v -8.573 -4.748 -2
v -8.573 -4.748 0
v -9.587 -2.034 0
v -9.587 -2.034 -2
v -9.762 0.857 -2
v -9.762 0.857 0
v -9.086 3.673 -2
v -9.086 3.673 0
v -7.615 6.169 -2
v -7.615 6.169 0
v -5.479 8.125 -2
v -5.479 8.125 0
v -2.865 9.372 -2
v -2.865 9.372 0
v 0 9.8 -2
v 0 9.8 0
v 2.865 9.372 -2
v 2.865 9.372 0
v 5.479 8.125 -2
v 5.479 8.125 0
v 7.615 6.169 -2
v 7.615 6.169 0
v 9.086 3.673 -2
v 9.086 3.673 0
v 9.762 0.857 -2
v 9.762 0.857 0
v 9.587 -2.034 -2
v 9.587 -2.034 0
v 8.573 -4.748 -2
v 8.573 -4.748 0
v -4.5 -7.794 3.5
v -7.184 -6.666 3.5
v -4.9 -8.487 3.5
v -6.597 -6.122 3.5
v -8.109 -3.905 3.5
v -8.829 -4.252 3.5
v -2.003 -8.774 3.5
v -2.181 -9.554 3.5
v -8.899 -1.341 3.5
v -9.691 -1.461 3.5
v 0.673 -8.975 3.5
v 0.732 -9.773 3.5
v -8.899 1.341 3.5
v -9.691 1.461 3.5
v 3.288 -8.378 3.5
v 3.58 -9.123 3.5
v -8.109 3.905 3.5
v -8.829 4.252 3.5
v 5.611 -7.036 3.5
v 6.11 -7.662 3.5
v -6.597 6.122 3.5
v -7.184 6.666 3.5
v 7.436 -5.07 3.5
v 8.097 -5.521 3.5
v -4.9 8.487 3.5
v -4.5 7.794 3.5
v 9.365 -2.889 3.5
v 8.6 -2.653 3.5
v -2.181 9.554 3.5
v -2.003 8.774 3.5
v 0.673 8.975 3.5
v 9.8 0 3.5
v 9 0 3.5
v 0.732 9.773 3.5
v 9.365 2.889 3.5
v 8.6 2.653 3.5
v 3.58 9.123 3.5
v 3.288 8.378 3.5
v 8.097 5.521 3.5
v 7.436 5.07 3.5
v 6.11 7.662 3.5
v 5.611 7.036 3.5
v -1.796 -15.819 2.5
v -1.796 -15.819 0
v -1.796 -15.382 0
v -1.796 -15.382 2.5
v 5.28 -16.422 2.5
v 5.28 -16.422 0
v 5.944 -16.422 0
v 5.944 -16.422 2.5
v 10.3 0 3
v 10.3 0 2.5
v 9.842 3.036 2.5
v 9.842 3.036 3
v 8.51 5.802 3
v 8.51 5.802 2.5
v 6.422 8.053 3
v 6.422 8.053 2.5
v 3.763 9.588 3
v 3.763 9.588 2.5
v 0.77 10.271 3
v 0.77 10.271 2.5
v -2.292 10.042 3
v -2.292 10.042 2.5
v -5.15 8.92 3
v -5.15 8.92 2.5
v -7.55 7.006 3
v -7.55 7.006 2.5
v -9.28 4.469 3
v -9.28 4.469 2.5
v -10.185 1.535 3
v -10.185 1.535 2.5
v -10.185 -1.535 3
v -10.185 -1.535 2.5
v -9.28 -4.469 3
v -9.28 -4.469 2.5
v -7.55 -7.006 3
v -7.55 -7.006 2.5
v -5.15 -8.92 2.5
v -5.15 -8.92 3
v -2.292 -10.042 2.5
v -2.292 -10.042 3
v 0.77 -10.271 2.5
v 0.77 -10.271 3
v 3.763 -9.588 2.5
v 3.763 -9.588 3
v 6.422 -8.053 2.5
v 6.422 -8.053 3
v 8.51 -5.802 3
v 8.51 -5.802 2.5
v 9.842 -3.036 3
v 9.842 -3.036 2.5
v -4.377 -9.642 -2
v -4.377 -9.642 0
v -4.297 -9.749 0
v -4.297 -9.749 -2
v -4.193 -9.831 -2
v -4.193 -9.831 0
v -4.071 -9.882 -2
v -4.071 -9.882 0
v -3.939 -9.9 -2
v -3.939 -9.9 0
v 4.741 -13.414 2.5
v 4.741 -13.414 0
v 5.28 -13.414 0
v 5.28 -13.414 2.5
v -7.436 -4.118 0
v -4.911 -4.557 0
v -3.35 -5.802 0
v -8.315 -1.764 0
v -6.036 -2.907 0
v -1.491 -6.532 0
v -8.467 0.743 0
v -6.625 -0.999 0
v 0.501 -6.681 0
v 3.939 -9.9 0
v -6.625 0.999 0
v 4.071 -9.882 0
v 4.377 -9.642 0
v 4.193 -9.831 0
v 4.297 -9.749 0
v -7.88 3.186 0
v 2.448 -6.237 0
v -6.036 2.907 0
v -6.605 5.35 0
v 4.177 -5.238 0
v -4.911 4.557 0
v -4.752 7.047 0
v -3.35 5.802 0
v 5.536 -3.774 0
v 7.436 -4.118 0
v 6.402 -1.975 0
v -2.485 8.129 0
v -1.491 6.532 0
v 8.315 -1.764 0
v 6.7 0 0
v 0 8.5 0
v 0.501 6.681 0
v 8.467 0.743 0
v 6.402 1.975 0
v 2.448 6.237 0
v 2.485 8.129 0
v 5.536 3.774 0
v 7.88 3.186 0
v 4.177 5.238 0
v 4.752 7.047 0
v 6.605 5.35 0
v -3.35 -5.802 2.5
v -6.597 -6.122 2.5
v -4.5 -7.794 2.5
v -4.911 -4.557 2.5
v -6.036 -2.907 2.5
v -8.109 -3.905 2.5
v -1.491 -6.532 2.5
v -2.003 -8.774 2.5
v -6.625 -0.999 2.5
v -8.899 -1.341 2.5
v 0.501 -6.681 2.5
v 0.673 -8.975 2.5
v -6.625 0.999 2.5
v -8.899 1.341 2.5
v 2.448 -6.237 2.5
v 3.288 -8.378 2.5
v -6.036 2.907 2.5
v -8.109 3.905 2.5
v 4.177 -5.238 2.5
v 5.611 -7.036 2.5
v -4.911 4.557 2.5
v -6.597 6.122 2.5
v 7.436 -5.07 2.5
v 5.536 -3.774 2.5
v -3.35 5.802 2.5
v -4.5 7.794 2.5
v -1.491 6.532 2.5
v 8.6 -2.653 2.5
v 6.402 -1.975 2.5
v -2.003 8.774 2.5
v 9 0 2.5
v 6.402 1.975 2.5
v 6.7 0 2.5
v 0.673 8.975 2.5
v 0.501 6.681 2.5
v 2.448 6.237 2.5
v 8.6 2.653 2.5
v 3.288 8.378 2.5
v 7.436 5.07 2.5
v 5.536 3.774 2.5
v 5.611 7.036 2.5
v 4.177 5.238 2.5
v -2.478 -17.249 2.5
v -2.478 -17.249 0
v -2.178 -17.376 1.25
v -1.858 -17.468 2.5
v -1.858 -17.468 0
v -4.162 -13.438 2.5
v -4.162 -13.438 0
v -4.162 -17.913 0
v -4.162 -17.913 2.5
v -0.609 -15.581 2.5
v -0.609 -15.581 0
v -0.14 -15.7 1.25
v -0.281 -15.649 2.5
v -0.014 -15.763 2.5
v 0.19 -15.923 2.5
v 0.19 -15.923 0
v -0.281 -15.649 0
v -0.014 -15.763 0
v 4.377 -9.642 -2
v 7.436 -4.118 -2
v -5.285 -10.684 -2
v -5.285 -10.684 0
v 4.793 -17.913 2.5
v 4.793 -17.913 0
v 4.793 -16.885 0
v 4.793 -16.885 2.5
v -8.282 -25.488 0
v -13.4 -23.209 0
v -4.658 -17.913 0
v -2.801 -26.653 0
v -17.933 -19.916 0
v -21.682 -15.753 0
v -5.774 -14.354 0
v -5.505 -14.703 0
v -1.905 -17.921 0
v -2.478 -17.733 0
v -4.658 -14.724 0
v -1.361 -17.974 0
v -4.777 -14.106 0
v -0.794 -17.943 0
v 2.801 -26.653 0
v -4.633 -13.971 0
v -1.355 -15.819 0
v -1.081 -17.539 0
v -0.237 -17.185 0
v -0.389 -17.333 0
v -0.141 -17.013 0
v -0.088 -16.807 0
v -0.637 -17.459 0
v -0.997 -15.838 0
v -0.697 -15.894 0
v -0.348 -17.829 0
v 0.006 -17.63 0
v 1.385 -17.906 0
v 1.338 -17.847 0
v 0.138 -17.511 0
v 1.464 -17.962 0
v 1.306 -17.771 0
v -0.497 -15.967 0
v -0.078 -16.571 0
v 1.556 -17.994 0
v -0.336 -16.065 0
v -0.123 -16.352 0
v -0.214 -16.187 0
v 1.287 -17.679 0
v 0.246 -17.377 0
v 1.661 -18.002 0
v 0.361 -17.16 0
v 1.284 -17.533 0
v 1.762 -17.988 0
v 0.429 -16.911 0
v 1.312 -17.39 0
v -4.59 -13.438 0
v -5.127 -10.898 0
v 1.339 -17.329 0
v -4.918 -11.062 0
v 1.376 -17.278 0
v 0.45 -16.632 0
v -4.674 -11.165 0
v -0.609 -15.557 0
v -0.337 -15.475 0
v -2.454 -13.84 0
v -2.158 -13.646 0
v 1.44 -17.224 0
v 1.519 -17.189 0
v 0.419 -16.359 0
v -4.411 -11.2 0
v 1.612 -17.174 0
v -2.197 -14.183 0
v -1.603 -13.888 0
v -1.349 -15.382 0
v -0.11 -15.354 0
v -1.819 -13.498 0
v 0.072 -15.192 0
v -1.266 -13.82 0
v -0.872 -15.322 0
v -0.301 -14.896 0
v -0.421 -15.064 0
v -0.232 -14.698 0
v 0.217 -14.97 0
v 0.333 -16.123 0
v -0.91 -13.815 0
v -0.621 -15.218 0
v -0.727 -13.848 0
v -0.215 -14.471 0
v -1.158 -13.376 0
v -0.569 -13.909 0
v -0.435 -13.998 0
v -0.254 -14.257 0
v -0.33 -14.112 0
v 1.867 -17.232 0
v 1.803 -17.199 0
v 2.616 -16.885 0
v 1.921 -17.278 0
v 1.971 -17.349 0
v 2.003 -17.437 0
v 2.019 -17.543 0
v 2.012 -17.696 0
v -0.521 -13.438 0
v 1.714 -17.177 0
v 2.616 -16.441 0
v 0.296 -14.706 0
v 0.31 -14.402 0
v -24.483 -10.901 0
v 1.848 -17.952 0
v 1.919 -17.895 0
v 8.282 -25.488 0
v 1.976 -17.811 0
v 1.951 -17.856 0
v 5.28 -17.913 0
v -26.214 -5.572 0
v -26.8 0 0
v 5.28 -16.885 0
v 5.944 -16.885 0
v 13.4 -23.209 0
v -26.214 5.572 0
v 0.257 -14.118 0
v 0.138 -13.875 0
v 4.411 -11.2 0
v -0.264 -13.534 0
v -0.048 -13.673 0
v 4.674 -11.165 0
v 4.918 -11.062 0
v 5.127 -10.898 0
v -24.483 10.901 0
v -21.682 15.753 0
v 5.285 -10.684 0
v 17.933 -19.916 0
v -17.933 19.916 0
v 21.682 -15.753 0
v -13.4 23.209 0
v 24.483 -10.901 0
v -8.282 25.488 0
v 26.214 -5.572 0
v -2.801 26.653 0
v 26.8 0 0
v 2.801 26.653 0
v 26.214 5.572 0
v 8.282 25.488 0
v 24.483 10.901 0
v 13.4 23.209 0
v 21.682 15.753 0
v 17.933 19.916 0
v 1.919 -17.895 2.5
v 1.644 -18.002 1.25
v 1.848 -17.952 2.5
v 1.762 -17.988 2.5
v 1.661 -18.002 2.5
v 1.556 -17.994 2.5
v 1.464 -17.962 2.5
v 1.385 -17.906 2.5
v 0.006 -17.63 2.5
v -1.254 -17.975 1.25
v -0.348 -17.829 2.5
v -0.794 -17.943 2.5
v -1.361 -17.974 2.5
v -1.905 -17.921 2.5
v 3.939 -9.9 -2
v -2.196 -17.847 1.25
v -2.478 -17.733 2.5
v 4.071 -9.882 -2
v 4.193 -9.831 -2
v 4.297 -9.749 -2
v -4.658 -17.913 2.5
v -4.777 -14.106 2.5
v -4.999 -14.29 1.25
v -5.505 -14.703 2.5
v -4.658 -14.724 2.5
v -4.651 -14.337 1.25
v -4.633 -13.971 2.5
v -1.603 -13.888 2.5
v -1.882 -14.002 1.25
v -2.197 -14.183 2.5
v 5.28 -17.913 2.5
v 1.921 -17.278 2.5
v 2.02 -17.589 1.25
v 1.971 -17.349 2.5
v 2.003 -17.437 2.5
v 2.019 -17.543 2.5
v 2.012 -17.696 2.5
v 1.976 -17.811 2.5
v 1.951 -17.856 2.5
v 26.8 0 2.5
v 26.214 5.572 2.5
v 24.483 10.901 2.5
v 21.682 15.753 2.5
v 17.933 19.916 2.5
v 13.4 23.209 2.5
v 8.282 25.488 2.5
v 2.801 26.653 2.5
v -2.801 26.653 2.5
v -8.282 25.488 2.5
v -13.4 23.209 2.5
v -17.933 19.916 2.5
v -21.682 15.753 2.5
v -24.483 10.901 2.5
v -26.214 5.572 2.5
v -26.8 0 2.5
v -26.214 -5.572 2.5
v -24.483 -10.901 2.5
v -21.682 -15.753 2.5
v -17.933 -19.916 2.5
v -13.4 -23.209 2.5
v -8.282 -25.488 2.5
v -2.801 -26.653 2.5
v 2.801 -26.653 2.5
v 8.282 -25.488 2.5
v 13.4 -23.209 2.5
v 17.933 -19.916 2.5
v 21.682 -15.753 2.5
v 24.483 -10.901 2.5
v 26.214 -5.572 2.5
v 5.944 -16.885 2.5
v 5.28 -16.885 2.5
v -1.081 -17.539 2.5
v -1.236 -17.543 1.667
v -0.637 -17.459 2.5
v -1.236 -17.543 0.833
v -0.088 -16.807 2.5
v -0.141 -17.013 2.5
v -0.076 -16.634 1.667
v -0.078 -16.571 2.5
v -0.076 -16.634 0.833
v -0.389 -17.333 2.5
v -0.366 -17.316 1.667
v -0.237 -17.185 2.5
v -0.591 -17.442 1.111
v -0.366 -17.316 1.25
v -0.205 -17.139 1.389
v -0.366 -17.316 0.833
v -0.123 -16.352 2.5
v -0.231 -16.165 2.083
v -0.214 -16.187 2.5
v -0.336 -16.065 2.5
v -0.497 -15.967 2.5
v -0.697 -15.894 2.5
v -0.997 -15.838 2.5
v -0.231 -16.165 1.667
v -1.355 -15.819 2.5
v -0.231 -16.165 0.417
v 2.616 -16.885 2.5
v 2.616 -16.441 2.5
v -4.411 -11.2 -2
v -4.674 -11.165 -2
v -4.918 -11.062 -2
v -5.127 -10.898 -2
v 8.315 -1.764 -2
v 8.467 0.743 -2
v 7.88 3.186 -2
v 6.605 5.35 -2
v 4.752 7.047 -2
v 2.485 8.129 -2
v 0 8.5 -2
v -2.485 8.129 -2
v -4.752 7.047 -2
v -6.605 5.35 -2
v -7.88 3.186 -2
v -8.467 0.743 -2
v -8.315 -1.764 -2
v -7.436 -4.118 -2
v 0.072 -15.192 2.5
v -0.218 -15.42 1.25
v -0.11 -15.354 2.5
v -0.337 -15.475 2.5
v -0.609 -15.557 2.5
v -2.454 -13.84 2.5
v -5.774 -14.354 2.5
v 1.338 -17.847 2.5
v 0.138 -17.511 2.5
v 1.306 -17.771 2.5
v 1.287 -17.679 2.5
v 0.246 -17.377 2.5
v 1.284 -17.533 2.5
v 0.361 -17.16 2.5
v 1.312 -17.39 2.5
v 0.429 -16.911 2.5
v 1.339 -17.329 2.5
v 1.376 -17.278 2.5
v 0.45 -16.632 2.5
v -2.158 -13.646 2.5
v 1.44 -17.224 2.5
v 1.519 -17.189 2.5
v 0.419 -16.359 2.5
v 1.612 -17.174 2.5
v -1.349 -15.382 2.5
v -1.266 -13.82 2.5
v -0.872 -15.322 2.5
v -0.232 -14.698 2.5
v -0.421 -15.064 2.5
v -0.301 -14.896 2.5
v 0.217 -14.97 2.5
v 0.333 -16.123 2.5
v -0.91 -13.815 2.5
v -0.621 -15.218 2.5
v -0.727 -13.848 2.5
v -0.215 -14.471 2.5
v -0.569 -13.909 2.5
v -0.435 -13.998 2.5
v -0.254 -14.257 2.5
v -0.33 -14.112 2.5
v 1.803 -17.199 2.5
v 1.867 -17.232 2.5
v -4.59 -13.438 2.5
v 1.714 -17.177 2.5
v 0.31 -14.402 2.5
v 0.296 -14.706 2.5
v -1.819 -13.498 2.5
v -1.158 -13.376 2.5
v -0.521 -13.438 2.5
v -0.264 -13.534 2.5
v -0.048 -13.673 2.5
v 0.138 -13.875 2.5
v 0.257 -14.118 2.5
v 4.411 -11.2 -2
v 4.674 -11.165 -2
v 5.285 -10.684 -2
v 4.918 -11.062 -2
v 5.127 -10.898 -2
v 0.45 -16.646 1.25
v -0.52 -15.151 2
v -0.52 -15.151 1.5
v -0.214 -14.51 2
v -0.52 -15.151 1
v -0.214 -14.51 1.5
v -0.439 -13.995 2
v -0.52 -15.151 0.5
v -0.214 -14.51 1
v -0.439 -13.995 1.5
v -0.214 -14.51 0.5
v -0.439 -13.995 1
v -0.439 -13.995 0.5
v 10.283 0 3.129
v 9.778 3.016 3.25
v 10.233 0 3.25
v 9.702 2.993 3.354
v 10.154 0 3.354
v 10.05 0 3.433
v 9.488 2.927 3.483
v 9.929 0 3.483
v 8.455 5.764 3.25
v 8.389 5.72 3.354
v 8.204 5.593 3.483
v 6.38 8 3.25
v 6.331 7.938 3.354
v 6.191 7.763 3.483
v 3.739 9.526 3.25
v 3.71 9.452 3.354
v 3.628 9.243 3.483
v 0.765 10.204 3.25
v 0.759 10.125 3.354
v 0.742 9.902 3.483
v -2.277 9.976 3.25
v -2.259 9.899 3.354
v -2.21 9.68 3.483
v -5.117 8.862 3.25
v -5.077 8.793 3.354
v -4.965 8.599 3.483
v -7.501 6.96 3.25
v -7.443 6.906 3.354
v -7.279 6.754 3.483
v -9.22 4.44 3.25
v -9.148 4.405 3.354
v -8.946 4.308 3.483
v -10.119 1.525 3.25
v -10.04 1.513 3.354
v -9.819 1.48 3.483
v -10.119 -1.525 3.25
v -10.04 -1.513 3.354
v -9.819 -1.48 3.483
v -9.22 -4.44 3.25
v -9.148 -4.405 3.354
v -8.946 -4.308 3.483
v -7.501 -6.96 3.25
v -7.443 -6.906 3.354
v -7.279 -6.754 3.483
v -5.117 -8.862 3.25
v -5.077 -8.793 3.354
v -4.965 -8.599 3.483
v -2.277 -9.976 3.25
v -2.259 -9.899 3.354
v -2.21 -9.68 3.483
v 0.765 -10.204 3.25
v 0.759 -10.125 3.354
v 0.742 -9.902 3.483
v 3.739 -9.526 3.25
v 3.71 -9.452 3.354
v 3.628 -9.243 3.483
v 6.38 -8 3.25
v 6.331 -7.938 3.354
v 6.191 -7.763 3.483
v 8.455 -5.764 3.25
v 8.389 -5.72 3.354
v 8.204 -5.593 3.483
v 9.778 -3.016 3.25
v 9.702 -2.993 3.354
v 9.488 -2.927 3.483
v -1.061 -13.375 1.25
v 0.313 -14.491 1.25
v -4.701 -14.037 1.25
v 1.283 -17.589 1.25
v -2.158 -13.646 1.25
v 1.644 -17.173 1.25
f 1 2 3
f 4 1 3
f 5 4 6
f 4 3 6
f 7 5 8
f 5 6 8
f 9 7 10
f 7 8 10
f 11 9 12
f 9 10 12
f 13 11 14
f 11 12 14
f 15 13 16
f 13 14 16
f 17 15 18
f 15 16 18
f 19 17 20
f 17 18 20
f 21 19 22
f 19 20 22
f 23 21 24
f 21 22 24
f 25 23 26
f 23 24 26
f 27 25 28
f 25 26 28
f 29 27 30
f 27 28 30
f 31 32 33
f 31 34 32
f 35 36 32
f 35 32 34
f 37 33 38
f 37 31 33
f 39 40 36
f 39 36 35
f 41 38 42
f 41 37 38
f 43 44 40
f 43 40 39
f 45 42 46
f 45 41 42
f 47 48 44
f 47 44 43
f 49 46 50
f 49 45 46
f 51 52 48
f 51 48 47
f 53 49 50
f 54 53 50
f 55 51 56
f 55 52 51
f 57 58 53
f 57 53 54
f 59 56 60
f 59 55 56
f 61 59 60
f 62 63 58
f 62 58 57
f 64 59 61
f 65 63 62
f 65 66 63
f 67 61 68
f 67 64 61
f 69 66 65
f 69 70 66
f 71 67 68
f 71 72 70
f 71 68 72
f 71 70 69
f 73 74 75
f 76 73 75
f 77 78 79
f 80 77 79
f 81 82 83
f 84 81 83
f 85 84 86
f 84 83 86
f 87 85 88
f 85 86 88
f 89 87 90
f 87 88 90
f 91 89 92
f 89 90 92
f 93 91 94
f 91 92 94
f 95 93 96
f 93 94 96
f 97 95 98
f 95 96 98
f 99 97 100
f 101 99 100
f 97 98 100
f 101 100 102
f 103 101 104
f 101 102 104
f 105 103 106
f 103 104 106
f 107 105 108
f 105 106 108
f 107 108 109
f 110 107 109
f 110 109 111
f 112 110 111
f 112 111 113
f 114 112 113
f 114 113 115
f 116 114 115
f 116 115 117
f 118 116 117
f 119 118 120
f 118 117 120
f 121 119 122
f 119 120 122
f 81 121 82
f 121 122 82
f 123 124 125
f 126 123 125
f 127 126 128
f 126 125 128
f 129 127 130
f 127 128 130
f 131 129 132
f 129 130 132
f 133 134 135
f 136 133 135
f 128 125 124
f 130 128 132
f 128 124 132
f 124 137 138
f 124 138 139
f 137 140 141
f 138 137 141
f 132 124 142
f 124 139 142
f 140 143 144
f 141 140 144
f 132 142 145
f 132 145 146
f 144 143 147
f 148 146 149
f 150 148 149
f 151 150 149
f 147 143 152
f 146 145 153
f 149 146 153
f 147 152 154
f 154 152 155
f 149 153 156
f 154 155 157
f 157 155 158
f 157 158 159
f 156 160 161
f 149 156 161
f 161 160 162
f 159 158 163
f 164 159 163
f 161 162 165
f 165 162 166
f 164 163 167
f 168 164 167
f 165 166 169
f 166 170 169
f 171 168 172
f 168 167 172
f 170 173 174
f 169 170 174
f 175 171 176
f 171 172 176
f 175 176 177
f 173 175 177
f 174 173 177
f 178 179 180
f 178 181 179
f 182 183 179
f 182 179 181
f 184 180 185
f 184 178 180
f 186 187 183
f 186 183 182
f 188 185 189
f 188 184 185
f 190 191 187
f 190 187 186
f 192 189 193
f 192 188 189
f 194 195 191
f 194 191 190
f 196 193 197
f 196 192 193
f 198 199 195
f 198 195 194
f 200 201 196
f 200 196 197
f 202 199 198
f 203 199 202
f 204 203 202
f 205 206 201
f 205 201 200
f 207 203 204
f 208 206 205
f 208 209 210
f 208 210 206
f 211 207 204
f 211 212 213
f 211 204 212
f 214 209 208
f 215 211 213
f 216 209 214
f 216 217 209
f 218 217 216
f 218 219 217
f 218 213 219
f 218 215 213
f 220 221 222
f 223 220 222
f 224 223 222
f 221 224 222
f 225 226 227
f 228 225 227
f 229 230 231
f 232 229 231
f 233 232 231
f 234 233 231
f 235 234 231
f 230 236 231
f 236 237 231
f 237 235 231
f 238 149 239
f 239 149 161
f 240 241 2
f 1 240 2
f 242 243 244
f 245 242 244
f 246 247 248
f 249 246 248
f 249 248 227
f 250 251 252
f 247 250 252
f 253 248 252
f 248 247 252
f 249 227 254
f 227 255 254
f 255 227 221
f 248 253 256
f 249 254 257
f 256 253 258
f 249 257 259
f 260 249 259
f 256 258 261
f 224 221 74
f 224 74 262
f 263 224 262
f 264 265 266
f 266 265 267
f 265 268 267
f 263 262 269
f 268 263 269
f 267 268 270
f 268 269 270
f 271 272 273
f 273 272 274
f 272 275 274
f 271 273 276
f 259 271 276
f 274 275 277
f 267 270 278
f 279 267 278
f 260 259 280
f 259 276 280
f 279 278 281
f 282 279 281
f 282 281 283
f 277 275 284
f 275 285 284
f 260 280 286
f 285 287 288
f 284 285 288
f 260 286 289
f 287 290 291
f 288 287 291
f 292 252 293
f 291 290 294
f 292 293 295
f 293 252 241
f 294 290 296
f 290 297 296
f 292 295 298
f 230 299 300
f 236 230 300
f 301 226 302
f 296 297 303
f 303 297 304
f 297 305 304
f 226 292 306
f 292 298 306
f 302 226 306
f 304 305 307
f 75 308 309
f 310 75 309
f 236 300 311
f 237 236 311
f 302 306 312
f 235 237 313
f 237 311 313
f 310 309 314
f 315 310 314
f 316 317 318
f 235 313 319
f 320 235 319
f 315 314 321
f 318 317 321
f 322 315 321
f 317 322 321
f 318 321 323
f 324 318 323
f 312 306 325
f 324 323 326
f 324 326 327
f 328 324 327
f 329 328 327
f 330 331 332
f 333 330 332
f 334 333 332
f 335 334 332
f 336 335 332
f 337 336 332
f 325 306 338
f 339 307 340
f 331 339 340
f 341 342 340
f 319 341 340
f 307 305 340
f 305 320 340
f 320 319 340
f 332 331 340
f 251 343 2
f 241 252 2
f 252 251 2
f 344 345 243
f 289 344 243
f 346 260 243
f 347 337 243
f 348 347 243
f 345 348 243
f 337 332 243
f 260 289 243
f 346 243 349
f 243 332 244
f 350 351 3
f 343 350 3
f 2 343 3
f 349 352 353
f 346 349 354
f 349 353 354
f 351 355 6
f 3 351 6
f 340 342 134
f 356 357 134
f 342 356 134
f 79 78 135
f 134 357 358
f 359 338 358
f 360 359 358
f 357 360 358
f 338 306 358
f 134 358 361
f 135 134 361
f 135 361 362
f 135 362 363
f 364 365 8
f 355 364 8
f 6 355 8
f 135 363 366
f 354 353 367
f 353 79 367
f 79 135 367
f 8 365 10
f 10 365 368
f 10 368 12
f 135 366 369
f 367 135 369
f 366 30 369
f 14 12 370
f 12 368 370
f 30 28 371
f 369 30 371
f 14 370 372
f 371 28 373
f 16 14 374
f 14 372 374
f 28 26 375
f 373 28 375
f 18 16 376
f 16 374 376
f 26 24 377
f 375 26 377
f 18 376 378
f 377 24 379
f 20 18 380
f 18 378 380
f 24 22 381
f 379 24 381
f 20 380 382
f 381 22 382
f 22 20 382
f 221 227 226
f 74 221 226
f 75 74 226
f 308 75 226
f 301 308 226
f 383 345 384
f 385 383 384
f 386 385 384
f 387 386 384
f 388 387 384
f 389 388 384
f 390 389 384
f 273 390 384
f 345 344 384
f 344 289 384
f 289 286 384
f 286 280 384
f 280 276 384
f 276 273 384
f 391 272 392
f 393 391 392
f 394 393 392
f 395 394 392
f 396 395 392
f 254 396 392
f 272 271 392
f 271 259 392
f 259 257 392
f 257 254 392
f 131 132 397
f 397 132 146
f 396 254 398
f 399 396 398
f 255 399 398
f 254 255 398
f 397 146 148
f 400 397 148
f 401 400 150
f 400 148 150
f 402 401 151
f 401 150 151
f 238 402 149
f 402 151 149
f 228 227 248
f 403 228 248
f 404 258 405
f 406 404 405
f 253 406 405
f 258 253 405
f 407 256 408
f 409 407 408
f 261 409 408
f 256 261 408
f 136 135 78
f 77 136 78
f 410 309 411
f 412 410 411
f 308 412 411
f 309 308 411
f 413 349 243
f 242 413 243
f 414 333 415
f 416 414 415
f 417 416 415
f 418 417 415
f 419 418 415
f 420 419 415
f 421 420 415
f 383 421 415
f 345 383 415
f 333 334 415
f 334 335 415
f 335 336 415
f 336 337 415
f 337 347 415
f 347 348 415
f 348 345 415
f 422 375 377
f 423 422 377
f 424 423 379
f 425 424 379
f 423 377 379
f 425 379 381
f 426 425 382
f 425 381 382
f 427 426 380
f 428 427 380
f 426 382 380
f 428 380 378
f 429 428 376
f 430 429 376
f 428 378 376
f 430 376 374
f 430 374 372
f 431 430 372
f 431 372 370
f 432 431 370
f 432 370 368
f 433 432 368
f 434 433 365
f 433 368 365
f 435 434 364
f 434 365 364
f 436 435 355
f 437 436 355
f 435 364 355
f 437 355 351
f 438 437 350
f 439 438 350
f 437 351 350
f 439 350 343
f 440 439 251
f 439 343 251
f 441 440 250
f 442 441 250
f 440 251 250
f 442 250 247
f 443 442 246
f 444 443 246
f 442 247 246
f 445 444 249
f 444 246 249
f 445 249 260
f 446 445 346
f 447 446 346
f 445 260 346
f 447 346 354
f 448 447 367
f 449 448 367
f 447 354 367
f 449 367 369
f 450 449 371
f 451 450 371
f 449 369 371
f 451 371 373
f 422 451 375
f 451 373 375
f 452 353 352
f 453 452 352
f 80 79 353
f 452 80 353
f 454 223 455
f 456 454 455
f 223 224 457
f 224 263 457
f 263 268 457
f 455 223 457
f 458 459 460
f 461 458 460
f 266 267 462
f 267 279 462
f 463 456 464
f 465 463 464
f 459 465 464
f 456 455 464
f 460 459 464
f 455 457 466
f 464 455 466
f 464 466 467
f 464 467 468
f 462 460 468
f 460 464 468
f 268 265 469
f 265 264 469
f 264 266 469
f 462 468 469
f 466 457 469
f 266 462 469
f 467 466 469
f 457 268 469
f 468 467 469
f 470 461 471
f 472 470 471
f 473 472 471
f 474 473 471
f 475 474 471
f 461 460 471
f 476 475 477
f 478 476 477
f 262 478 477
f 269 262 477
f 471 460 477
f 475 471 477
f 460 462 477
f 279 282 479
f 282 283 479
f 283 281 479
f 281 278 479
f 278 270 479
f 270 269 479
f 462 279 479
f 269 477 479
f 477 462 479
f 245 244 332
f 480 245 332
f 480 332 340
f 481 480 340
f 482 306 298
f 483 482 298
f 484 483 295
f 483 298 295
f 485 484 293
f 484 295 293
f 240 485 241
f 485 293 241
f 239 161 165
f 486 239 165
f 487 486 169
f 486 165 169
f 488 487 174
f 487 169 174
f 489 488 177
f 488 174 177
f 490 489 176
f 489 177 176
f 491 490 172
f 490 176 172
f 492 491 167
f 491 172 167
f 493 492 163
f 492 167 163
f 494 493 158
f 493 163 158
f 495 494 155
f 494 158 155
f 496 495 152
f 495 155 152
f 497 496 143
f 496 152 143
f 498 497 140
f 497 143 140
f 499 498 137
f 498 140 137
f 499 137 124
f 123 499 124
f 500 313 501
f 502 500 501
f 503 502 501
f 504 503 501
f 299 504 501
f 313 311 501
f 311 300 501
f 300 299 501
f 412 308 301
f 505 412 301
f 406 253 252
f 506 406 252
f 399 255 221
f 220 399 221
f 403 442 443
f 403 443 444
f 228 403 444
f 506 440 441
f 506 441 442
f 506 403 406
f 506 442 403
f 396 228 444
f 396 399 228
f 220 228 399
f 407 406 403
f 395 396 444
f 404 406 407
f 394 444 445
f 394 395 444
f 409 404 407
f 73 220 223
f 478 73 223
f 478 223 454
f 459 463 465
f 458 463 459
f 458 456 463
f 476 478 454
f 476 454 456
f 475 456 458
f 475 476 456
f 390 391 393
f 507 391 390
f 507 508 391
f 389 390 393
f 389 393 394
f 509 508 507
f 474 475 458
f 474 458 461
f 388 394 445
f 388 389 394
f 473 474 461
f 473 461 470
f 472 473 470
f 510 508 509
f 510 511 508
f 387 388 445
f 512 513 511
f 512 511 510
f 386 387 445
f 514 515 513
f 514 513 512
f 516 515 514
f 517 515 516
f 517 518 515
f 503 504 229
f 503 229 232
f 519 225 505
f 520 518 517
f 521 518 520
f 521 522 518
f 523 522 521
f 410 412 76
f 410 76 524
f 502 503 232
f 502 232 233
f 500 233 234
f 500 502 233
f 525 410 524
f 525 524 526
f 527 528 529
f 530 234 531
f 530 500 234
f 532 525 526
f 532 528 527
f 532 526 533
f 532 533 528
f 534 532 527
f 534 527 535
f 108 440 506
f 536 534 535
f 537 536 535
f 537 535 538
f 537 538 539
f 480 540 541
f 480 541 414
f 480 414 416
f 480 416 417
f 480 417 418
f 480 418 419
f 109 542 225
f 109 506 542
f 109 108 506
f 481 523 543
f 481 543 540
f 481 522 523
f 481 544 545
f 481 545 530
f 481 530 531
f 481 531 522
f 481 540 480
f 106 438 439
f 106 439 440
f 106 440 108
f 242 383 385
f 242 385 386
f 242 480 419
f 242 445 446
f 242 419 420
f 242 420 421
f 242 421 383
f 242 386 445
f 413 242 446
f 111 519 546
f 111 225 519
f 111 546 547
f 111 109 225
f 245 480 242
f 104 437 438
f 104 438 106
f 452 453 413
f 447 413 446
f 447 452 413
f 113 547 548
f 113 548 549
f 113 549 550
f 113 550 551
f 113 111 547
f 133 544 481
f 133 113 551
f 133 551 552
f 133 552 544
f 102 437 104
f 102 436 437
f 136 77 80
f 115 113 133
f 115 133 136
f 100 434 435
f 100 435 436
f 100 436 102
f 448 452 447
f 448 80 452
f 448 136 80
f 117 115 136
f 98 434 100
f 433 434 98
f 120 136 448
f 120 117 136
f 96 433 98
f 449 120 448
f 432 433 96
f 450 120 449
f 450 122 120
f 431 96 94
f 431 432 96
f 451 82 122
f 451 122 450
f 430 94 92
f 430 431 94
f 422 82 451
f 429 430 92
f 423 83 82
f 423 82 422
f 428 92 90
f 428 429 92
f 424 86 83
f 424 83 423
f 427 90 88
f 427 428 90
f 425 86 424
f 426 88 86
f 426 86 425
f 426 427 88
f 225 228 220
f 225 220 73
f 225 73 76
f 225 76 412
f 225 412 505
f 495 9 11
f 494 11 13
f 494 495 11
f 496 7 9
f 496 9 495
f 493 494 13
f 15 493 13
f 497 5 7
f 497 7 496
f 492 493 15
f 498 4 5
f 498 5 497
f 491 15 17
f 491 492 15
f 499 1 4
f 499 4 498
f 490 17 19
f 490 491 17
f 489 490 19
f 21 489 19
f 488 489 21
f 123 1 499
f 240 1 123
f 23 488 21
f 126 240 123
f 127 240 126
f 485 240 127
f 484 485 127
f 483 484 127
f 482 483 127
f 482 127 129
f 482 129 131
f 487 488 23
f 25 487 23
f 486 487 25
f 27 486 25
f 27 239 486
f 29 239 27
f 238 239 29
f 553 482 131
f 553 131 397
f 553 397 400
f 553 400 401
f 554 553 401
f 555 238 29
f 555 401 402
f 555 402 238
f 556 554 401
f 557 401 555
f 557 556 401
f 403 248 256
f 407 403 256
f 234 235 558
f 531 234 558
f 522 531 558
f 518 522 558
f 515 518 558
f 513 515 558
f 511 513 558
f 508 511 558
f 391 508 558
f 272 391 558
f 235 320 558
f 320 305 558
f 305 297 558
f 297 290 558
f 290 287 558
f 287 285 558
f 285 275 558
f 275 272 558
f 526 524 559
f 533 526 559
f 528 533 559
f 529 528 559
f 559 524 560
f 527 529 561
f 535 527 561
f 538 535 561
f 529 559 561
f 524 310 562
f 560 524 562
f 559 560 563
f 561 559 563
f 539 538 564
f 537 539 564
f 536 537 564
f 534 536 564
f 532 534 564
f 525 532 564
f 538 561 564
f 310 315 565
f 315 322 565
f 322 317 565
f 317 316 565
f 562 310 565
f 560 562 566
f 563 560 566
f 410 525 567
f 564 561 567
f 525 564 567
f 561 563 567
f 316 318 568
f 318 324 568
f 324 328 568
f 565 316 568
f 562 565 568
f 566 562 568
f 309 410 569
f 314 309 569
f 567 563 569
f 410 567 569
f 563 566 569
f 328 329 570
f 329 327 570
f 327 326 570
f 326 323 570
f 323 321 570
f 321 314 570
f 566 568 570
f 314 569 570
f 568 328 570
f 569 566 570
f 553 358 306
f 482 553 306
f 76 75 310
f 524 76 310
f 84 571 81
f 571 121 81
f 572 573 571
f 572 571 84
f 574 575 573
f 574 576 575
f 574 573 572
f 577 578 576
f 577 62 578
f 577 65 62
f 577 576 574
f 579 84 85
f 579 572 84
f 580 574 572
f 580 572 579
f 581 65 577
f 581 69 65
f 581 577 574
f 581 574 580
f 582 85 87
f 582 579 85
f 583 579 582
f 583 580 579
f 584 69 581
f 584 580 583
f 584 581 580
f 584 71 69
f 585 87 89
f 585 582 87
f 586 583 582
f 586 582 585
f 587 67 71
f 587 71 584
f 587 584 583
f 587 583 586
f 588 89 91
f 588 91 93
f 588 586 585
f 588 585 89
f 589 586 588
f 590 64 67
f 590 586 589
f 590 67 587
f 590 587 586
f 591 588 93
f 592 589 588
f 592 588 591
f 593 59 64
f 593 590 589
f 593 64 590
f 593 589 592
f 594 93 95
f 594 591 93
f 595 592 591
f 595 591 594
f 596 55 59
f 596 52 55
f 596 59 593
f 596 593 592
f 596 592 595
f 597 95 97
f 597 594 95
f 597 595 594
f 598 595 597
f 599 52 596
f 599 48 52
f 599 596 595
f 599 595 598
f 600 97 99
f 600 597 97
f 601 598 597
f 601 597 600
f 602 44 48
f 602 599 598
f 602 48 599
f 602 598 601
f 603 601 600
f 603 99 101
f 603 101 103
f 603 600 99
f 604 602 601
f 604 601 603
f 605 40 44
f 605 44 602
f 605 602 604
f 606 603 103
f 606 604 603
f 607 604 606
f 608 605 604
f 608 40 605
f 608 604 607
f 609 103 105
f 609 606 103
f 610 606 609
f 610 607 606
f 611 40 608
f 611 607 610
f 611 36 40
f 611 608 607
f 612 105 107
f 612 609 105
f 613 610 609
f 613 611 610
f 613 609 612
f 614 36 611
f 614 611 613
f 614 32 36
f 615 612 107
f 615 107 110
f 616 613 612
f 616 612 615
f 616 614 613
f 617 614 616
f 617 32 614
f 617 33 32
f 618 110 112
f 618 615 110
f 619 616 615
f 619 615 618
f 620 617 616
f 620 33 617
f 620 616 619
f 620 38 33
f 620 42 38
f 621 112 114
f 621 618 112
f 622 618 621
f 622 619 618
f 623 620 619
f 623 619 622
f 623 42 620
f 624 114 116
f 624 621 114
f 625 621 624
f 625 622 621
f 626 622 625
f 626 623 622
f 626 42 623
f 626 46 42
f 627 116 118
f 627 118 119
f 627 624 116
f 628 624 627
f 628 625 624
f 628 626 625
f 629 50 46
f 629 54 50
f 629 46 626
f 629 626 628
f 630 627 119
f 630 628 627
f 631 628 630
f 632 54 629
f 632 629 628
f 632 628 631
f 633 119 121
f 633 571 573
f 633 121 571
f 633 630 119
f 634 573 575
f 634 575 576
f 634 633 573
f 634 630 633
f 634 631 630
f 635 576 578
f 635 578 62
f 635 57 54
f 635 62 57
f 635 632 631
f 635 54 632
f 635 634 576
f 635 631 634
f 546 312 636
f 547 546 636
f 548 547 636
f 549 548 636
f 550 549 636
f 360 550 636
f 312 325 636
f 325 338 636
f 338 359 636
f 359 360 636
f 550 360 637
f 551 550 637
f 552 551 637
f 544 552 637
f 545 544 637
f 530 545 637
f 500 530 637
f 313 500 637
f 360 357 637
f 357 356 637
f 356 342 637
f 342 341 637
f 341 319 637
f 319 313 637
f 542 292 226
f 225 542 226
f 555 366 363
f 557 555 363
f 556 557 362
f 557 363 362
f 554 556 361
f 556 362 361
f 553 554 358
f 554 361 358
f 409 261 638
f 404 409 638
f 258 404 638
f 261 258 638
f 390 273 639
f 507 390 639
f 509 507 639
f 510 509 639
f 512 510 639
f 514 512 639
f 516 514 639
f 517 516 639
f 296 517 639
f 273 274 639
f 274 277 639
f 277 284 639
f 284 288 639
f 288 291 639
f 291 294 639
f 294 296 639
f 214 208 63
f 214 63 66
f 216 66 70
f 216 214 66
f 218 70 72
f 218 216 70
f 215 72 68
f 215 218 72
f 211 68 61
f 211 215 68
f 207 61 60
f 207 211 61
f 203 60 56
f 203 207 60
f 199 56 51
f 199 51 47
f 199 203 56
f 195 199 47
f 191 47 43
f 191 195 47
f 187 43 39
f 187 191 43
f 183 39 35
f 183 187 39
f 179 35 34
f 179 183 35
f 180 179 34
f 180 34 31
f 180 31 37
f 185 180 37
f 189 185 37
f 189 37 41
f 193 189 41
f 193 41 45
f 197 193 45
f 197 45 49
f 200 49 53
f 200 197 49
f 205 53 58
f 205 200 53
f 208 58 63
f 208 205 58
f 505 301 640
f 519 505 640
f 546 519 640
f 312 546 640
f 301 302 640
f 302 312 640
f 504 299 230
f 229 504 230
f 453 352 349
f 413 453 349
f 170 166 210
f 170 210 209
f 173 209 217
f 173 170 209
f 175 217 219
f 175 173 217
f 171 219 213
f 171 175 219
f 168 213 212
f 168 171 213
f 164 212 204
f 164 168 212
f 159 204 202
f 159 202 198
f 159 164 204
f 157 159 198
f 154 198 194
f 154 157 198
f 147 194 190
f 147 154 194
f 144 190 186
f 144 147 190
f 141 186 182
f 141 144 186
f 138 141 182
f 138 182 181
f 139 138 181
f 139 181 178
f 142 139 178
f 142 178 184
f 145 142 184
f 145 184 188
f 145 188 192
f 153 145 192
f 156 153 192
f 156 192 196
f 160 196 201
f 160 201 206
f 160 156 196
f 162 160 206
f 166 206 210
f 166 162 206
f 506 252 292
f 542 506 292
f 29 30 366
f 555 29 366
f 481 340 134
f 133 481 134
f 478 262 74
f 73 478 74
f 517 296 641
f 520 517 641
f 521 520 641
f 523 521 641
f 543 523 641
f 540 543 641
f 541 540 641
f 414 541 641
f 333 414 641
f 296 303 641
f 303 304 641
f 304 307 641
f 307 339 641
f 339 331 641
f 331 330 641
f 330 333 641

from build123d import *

# Parameters (mm, degrees)
F3_R     = 26.8
F3_R_2   = 6.7
F4_DEPTH = 2.5
F5_R     = 10.3
F5_R_2   = 9
F6_DEPTH = 1
F7_R     = 0.5
F9_DEPTH = 2


with BuildPart() as f4:
    # F3 (on Top) → F4 (new body)
    with BuildSketch(Plane.XY):
        Circle(F3_R)
        with BuildLine():
            Line((-4.1619996915, -13.4381969615), (-4.1619996915, -17.9131179147))
            Line((-4.1619996915, -17.9131179147), (-4.657580782, -17.9131179147))
            Line((-4.657580782, -17.9131179147), (-4.657580782, -14.7241613326))
            add(Edge.make_bspline(
                [(-4.657580782, -14.7241613326), (-4.657580782, -14.3255417599), (-4.6330955502, -13.9709956042)],
                knots=[0, 0, 0, 1, 1, 1], degree=2))
            add(Edge.make_bspline(
                [(-4.6330955502, -13.9709956042), (-4.6967571528, -14.035636616), (-4.7765790083, -14.1056643788)],
                knots=[0, 0, 0, 1, 1, 1], degree=2))
            add(Edge.make_bspline(
                [(-4.7765790083, -14.1056643788), (-4.8564008637, -14.1756921416), (-5.5047698003, -14.7026143287)],
                knots=[0, 0, 0, 1, 1, 1], degree=2))
            Line((-5.5047698003, -14.7026143287), (-5.7741073494, -14.3539446287))
            Line((-5.7741073494, -14.3539446287), (-4.5900015424, -13.4381969615))
            Line((-4.5900015424, -13.4381969615), (-4.1619996915, -13.4381969615))
        make_face(mode=Mode.SUBTRACT)
        with BuildLine():
            add(Edge.make_bspline(
                [(-0.0484807588, -13.6727654816), (0.3129212617, -13.9709956042), (0.3129212617, -14.4910619264)],
                knots=[0, 0, 0, 1, 1, 1], degree=2))
            add(Edge.make_bspline(
                [(0.3129212617, -14.4910619264), (0.3129212617, -14.9200431866), (0.072476286, -15.1923189635)],
                knots=[0, 0, 0, 1, 1, 1], degree=2))
            add(Edge.make_bspline(
                [(0.072476286, -15.1923189635), (-0.1679686898, -15.4645947405), (-0.6087028611, -15.5566592118)],
                knots=[0, 0, 0, 1, 1, 1], degree=2))
            Line((-0.6087028611, -15.5566592118), (-0.6087028611, -15.5811444436))
            add(Edge.make_bspline(
                [(-0.6087028611, -15.5811444436), (-0.0700277628, -15.6477442739), (0.1900053983, -15.9234479833)],
                knots=[0, 0, 0, 1, 1, 1], degree=2))
            add(Edge.make_bspline(
                [(0.1900053983, -15.9234479833), (0.4500385594, -16.1991516928), (0.4500385594, -16.6457623197)],
                knots=[0, 0, 0, 1, 1, 1], degree=2))
            add(Edge.make_bspline(
                [(0.4500385594, -16.6457623197), (0.4500385594, -17.2853165728), (0.0063661603, -17.6300686358)],
                knots=[0, 0, 0, 1, 1, 1], degree=2))
            add(Edge.make_bspline(
                [(0.0063661603, -17.6300686358), (-0.4373062389, -17.9748206987), (-1.2541335698, -17.9748206987)],
                knots=[0, 0, 0, 1, 1, 1], degree=2))
            add(Edge.make_bspline(
                [(-1.2541335698, -17.9748206987), (-1.6096591347, -17.9748206987), (-1.9049510295, -17.9209531889)],
                knots=[0, 0, 0, 1, 1, 1], degree=2))
            add(Edge.make_bspline(
                [(-1.9049510295, -17.9209531889), (-2.2002429243, -17.867085679), (-2.4783951569, -17.7329066091)],
                knots=[0, 0, 0, 1, 1, 1], degree=2))
            Line((-2.4783951569, -17.7329066091), (-2.4783951569, -17.2490784299))
            add(Edge.make_bspline(
                [(-2.4783951569, -17.2490784299), (-2.1875106038, -17.3930515925), (-1.8584290892, -17.4679764016)],
                knots=[0, 0, 0, 1, 1, 1], degree=2))
            add(Edge.make_bspline(
                [(-1.8584290892, -17.4679764016), (-1.5293475746, -17.5429012108), (-1.2355247937, -17.5429012108)],
                knots=[0, 0, 0, 1, 1, 1], degree=2))
            add(Edge.make_bspline(
                [(-1.2355247937, -17.5429012108), (-0.0759042184, -17.5429012108), (-0.0759042184, -16.6340094085)],
                knots=[0, 0, 0, 1, 1, 1], degree=2))
            add(Edge.make_bspline(
                [(-0.0759042184, -16.6340094085), (-0.0759042184, -15.8191408961), (-1.3550127246, -15.8191408961)],
                knots=[0, 0, 0, 1, 1, 1], degree=2))
            Line((-1.3550127246, -15.8191408961), (-1.795746896, -15.8191408961))
            Line((-1.795746896, -15.8191408961), (-1.795746896, -15.3823243618))
            Line((-1.795746896, -15.3823243618), (-1.349136269, -15.3823243618))
            add(Edge.make_bspline(
                [(-1.349136269, -15.3823243618), (-0.826131719, -15.3823243618), (-0.5200663222, -15.1511837742)],
                knots=[0, 0, 0, 1, 1, 1], degree=2))
            add(Edge.make_bspline(
                [(-0.5200663222, -15.1511837742), (-0.2140009254, -14.9200431866), (-0.2140009254, -14.5096707026)],
                knots=[0, 0, 0, 1, 1, 1], degree=2))
            add(Edge.make_bspline(
                [(-0.2140009254, -14.5096707026), (-0.2140009254, -14.1825480065), (-0.4387753528, -13.995480836)],
                knots=[0, 0, 0, 1, 1, 1], degree=2))
            add(Edge.make_bspline(
                [(-0.4387753528, -13.995480836), (-0.6635497802, -13.8084136655), (-1.0494370325, -13.8084136655)],
                knots=[0, 0, 0, 1, 1, 1], degree=2))
            add(Edge.make_bspline(
                [(-1.0494370325, -13.8084136655), (-1.3432598134, -13.8084136655), (-1.6032929745, -13.8882355209)],
                knots=[0, 0, 0, 1, 1, 1], degree=2))
            add(Edge.make_bspline(
                [(-1.6032929745, -13.8882355209), (-1.8633261356, -13.9680573764), (-2.1973046965, -14.1825480065)],
                knots=[0, 0, 0, 1, 1, 1], degree=2))
            Line((-2.1973046965, -14.1825480065), (-2.4539099252, -13.8397547621))
            add(Edge.make_bspline(
                [(-2.4539099252, -13.8397547621), (-2.1786959204, -13.6223259042), (-1.8192527184, -13.4984306316)],
                knots=[0, 0, 0, 1, 1, 1], degree=2))
            add(Edge.make_bspline(
                [(-1.8192527184, -13.4984306316), (-1.4598095165, -13.374535359), (-1.0611899437, -13.374535359)],
                knots=[0, 0, 0, 1, 1, 1], degree=2))
            add(Edge.make_bspline(
                [(-1.0611899437, -13.374535359), (-0.4098827794, -13.374535359), (-0.0484807588, -13.6727654816)],
                knots=[0, 0, 0, 1, 1, 1], degree=2))
        make_face(mode=Mode.SUBTRACT)
        Circle(F3_R_2, mode=Mode.SUBTRACT)
        with BuildLine():
            add(Edge.make_bspline(
                [(1.3848847073, -17.9057723452), (1.2825364387, -17.8093005321), (1.2825364387, -17.5889334464)],
                knots=[0, 0, 0, 1, 1, 1], degree=2))
            add(Edge.make_bspline(
                [(1.2825364387, -17.5889334464), (1.2825364387, -17.3832574998), (1.3760700239, -17.2779710033)],
                knots=[0, 0, 0, 1, 1, 1], degree=2))
            add(Edge.make_bspline(
                [(1.3760700239, -17.2779710033), (1.4696036092, -17.1726845068), (1.6439384592, -17.1726845068)],
                knots=[0, 0, 0, 1, 1, 1], degree=2))
            add(Edge.make_bspline(
                [(1.6439384592, -17.1726845068), (1.821211537, -17.1726845068), (1.9206215779, -17.2779710033)],
                knots=[0, 0, 0, 1, 1, 1], degree=2))
            add(Edge.make_bspline(
                [(1.9206215779, -17.2779710033), (2.0200316187, -17.3832574998), (2.0200316187, -17.5889334464)],
                knots=[0, 0, 0, 1, 1, 1], degree=2))
            add(Edge.make_bspline(
                [(2.0200316187, -17.5889334464), (2.0200316187, -17.7877535282), (1.9191524639, -17.8949988432)],
                knots=[0, 0, 0, 1, 1, 1], degree=2))
            add(Edge.make_bspline(
                [(1.9191524639, -17.8949988432), (1.8182733092, -18.0022441582), (1.6439384592, -18.0022441582)],
                knots=[0, 0, 0, 1, 1, 1], degree=2))
            add(Edge.make_bspline(
                [(1.6439384592, -18.0022441582), (1.487232976, -18.0022441582), (1.3848847073, -17.9057723452)],
                knots=[0, 0, 0, 1, 1, 1], degree=2))
        make_face(mode=Mode.SUBTRACT)
        Polygon((5.9435451531, -16.4224570062), (5.9435451531, -16.8847381815), (5.2795056682, -16.8847381815), (5.2795056682, -17.9131179147), (4.7927392612, -17.9131179147), (4.7927392612, -16.8847381815), (2.616491864, -16.8847381815), (2.616491864, -16.4410657824), (4.7408305699, -13.4137117298), (5.2795056682, -13.4137117298), (5.2795056682, -16.4224570062), align=None, mode=Mode.SUBTRACT)
    extrude(amount=F4_DEPTH)

    # F5 (on face) → F6 (join)
    with BuildSketch(Plane.XY.offset(2.5)):
        Circle(F5_R)
        Circle(F5_R_2, mode=Mode.SUBTRACT)
    extrude(amount=F6_DEPTH)

    # F7
    f7_edges = [f4.edges().sort_by_distance(p)[0] for p in [
        (-10.3, 0, 3.5),
    ]]
    fillet(f7_edges, radius=F7_R)

    # F8 (on face) → F9 (join)
    with BuildSketch(Plane(origin=(0, 0, 0), x_dir=(1, 0, 0), z_dir=(0, 0, -1))):
        with BuildLine():
            Line((-5.2854986866, 10.6844577384), (-8.5731837258, 4.7476858367))
            ThreePointArc((-8.5731837258, 4.7476858367), (0, -9.8), (8.5731837258, 4.7476858367))
            Line((8.5731837258, 4.7476858367), (5.2854986866, 10.6844577384))
            ThreePointArc((5.2854986866, 10.6844577384), (4.9183956817, 11.0615270566), (4.4106840207, 11.2))
            Line((4.4106840207, 11.2), (-4.4106840207, 11.2))
            ThreePointArc((-4.4106840207, 11.2), (-4.9183956817, 11.0615270566), (-5.2854986866, 10.6844577384))
        make_face()
        with BuildLine():
            ThreePointArc((7.4359246601, 4.1178907767), (0, -8.5), (-7.4359246601, 4.1178907767))
            Line((-7.4359246601, 4.1178907767), (-4.3766385702, 9.6422288692))
            ThreePointArc((-4.3766385702, 9.6422288692), (-4.1930870677, 9.8307635283), (-3.9392312372, 9.9))
            Line((-3.9392312372, 9.9), (3.9392312372, 9.9))
            ThreePointArc((3.9392312372, 9.9), (4.1930870677, 9.8307635283), (4.3766385702, 9.6422288692))
            Line((4.3766385702, 9.6422288692), (7.4359246601, 4.1178907767))
        make_face(mode=Mode.SUBTRACT)
    extrude(amount=F9_DEPTH)


solid = f4.part
